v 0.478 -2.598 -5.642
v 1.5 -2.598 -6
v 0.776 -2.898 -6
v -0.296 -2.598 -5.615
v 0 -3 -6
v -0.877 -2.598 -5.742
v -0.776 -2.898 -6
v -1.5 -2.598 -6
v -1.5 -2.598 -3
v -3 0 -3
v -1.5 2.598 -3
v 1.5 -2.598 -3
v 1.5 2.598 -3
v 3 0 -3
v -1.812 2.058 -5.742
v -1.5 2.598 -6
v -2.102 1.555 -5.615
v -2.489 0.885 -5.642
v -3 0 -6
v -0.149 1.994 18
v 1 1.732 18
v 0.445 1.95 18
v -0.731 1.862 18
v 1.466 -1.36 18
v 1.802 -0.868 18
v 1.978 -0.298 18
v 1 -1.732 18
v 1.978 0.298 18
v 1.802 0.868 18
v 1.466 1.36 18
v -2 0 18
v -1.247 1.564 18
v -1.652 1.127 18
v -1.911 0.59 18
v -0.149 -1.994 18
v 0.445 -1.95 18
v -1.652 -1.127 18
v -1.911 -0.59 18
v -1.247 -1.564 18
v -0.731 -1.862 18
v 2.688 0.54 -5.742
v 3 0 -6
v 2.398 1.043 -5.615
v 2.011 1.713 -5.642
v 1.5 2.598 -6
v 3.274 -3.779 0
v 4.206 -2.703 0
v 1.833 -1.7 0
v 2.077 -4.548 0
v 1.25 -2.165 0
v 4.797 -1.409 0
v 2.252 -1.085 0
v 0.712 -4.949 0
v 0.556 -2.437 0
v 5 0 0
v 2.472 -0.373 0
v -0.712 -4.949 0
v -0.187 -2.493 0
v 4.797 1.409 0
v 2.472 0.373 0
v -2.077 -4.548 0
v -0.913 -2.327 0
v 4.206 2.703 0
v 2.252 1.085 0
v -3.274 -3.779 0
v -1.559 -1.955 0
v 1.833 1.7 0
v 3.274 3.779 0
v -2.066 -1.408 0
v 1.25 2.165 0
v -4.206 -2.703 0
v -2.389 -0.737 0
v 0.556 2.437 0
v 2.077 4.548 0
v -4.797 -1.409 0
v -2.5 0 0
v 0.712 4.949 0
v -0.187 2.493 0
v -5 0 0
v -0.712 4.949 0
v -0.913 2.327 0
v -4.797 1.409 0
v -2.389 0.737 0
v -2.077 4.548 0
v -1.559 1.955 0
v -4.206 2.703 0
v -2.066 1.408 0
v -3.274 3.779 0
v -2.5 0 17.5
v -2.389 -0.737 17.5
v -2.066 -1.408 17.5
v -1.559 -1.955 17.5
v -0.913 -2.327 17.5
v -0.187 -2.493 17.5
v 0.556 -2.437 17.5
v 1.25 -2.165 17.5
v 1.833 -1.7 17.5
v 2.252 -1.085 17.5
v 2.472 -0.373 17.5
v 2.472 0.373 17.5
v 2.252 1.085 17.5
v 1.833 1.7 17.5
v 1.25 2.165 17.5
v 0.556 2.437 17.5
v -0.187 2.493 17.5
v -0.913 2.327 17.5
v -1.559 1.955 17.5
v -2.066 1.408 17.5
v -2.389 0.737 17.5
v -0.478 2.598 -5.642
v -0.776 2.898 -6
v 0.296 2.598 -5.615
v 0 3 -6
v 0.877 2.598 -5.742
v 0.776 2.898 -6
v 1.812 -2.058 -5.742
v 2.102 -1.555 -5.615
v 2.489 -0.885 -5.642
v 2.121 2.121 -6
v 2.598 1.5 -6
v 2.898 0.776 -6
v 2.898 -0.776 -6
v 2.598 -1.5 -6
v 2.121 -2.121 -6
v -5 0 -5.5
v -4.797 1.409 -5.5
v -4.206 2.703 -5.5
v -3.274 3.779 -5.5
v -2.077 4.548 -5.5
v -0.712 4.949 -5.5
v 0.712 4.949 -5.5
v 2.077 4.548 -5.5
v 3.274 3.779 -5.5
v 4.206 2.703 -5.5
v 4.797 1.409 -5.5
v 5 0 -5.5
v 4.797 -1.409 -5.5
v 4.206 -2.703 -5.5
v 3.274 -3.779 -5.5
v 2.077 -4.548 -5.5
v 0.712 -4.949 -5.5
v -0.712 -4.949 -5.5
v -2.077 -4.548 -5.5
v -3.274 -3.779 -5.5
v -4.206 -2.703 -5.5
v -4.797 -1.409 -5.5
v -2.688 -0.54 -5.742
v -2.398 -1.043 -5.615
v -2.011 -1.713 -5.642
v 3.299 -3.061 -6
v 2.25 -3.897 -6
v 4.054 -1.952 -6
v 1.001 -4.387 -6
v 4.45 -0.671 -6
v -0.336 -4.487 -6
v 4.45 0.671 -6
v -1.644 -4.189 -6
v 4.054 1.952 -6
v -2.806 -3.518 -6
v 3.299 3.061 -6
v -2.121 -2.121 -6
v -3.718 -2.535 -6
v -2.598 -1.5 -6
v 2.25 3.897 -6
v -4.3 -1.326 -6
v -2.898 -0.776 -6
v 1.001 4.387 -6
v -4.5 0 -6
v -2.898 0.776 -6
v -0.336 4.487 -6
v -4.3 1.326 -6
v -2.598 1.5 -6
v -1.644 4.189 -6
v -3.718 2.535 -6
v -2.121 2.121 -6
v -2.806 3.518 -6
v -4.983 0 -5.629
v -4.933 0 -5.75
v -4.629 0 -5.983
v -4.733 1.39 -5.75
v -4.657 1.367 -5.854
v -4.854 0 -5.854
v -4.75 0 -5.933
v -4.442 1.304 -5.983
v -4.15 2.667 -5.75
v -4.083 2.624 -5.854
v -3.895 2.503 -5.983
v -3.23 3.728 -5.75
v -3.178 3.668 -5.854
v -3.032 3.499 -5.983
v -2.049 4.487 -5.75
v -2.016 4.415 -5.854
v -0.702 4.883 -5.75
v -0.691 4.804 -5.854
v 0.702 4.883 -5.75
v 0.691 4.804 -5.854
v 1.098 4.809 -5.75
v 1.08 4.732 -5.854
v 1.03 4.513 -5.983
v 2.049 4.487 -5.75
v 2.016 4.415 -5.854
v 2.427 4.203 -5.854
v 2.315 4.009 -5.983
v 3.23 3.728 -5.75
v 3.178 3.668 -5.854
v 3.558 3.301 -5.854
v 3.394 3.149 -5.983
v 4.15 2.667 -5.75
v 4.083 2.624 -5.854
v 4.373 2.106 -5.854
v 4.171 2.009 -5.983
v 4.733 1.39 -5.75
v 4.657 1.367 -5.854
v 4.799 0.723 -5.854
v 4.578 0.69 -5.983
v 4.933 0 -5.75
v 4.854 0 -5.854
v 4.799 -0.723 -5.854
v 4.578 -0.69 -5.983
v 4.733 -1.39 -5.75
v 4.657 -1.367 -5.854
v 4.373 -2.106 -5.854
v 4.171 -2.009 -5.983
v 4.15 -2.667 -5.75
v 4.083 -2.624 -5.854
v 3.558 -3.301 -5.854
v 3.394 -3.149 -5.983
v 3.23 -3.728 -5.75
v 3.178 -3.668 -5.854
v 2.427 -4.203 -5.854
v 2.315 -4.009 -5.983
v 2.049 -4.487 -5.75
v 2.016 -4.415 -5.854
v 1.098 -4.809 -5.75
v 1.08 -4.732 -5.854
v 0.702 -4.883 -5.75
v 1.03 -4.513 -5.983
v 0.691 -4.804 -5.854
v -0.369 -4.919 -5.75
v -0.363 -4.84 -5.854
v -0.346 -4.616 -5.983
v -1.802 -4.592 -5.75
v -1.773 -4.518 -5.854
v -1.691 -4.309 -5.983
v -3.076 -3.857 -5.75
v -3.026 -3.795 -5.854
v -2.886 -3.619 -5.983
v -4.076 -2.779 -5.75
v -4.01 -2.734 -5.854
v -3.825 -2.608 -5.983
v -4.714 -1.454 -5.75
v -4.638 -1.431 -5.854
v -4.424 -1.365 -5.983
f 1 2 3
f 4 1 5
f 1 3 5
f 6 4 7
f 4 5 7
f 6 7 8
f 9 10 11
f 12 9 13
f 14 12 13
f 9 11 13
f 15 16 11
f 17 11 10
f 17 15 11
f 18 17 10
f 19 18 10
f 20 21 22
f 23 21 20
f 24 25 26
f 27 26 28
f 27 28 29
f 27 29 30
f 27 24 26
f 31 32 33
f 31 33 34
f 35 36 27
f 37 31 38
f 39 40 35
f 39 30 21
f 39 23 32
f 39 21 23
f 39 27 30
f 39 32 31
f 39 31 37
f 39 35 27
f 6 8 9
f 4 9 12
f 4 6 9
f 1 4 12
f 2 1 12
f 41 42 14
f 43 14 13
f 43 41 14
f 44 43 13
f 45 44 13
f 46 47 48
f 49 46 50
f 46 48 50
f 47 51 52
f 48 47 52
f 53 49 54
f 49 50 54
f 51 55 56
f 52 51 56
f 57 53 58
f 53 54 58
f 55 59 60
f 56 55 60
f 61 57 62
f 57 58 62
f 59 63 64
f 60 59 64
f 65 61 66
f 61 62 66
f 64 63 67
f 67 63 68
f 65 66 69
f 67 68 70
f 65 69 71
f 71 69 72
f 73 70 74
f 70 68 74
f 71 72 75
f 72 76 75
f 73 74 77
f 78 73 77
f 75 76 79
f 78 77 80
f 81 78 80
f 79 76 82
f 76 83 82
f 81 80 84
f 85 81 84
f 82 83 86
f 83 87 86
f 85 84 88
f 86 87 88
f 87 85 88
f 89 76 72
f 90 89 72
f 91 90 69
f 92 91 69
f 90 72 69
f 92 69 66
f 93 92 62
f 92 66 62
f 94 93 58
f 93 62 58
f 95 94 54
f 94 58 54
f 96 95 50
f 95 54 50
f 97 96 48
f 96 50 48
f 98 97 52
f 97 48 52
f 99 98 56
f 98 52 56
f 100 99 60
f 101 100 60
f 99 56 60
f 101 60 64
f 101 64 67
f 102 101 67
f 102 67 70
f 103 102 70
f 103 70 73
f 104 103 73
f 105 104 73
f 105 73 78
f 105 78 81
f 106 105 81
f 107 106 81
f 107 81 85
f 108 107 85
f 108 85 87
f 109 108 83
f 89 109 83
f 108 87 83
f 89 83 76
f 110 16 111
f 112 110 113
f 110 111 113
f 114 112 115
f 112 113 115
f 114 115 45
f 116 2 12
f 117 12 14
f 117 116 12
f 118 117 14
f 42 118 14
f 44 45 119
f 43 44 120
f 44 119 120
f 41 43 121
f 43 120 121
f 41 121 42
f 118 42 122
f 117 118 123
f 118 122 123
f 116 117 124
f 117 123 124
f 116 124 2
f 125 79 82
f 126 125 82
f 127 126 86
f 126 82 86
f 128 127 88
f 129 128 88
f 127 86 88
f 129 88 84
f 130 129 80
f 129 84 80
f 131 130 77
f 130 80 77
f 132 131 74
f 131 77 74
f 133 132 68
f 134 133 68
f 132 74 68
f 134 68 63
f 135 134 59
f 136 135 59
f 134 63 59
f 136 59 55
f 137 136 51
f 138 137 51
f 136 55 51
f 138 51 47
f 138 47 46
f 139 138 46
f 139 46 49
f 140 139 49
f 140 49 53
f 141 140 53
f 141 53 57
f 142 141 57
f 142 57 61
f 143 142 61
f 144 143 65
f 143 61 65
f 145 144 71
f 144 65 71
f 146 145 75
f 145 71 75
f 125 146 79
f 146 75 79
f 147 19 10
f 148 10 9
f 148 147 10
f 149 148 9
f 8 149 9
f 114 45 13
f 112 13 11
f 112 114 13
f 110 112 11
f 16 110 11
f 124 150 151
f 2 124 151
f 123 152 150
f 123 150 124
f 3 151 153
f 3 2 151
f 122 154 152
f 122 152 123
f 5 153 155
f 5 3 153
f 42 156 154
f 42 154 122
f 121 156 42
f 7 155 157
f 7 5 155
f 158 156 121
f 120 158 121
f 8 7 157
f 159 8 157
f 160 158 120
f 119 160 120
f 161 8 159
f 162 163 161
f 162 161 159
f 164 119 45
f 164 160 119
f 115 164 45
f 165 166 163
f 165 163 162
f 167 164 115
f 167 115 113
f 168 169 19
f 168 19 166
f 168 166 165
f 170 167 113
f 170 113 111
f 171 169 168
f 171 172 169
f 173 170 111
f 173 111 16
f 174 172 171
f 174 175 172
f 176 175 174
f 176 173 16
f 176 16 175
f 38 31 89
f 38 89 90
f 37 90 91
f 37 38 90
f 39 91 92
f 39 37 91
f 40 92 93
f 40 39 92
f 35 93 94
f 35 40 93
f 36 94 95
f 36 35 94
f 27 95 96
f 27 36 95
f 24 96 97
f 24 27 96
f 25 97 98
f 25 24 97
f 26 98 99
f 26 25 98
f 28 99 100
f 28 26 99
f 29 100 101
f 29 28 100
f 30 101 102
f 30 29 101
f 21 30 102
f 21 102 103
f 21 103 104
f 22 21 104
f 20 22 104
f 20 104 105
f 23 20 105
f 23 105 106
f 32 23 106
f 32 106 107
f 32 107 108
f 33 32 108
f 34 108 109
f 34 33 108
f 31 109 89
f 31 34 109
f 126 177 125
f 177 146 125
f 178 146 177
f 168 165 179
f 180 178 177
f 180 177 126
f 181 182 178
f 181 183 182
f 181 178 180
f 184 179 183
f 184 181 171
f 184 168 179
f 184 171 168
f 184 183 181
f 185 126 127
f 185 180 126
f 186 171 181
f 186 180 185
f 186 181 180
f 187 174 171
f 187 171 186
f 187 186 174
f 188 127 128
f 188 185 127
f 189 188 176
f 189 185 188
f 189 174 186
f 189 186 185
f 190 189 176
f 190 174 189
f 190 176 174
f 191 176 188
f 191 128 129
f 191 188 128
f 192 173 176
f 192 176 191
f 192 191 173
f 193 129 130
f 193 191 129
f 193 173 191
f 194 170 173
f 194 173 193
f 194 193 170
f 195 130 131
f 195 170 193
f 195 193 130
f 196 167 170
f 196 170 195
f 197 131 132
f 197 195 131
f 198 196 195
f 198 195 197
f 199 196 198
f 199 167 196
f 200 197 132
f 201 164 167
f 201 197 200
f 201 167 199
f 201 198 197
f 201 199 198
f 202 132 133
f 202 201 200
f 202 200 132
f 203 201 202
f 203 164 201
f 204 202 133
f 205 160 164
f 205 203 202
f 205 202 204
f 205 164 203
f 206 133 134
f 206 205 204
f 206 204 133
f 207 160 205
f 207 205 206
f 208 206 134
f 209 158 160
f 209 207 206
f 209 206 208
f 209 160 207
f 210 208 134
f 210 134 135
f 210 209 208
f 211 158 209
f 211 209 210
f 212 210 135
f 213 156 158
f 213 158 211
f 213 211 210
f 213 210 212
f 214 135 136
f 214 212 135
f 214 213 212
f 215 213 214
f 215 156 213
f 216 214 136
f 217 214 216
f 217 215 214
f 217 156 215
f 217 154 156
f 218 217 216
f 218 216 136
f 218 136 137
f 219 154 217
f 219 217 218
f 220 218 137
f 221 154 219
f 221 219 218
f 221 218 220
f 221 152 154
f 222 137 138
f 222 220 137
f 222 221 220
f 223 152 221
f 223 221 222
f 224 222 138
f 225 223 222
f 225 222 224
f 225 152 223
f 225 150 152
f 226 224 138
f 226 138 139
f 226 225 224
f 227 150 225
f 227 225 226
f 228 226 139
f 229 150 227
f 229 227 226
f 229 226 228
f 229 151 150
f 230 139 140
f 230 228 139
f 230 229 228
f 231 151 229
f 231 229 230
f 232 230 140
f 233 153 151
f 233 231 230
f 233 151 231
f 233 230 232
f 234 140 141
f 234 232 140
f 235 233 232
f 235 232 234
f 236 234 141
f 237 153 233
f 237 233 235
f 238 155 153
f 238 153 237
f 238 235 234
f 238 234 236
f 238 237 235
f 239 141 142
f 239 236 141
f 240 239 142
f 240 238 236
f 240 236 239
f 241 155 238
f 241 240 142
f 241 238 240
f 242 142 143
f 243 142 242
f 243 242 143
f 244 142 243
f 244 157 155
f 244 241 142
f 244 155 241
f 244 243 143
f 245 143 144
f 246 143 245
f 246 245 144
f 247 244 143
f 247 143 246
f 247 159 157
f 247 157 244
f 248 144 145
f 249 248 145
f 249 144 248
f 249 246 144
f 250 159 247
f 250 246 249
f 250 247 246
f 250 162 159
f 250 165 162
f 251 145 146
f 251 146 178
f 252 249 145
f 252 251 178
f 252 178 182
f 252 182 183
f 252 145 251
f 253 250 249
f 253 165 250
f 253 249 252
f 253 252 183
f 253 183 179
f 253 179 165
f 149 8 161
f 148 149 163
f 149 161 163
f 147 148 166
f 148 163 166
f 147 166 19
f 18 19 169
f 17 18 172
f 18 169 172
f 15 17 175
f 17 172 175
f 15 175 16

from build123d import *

# Parameters (mm, degrees)
ESQUISSE1_R             = 2.5
BASE_EXTRUSION_DEPTH    = 18
CHANFREIN1_SIZE         = 0.5
ESQUISSE2_R             = 5
BOSS_EXTRU_1_DEPTH      = 6
ENL_V_MAT_EXTRU_1_DEPTH = 3
ESQUISSE4_R             = 3
ENL_V_MAT_EXTRU_2_DEPTH = 0.5
ENL_V_MAT_EXTRU_2_DRAFT = -45
CONG_1_R                = 0.5


with BuildPart() as part:
    # Esquisse1 → Base-Extrusion (new body)
    with BuildSketch(Plane.XY):
        with Locations(Location((0, 0, 0), (0, 0, 180))):  # turned: the seam where the file's is
            Circle(ESQUISSE1_R)
    extrude(amount=BASE_EXTRUSION_DEPTH)

    # Chanfrein1
    chanfrein1_edges = [part.edges().sort_by_distance(p)[0] for p in [
        (2.5, 0, 18),
    ]]
    chamfer(chanfrein1_edges, length=CHANFREIN1_SIZE)

    # Esquisse2 → Boss.-Extru.1 (add)
    with BuildSketch(Plane(origin=(0, 0, 0), x_dir=(-1, 0, 0), z_dir=(0, 0, -1))):
        Circle(ESQUISSE2_R)
    extrude(amount=BOSS_EXTRU_1_DEPTH)

    # Esquisse3 → Enlèv. mat.-Extru.1 (cut)
    with BuildSketch(Plane(origin=(0, 0, -6), x_dir=(-1, 0, 0), z_dir=(0, 0, -1))):
        Polygon((-3, 0), (-1.5, 2.598076211), (1.5, 2.598076211), (3, 0), (1.5, -2.598076211), (-1.5, -2.598076211), align=None)
    extrude(amount=-ENL_V_MAT_EXTRU_1_DEPTH, mode=Mode.SUBTRACT)


with BuildPart() as enl_v_mat_extru_2_tool:
    # Esquisse4 → Enlèv. mat.-Extru.2 (with draft: the straight prism first)
    with BuildSketch(Plane(origin=(0, 0, -6), x_dir=(-1, 0, 0), z_dir=(0, 0, -1))):
        Circle(ESQUISSE4_R)
    extrude(amount=-ENL_V_MAT_EXTRU_2_DEPTH)
    # Enlèv. mat.-Extru.2: the draft: its side faces are tilted about the plane it starts from
    enl_v_mat_extru_2_sides = [enl_v_mat_extru_2_tool.faces().sort_by_distance(p)[0] for p in [
        (3, 0, -5.75),
    ]]
    draft(enl_v_mat_extru_2_sides, Plane(origin=(0, 0, -6), x_dir=(-1, 0, 0), z_dir=(0, 0, -1)), ENL_V_MAT_EXTRU_2_DRAFT)


with BuildPart() as part_1:
    add(part.part)

    # Enlèv. mat.-Extru.2: cut by enl_v_mat_extru_2_tool
    add(enl_v_mat_extru_2_tool.part, mode=Mode.SUBTRACT)

    # Congé1
    cong_1_edges = [part_1.edges().sort_by_distance(p)[0] for p in [
        (5, 0, -6),
    ]]
    fillet(cong_1_edges, radius=CONG_1_R)


solid = part_1.part
